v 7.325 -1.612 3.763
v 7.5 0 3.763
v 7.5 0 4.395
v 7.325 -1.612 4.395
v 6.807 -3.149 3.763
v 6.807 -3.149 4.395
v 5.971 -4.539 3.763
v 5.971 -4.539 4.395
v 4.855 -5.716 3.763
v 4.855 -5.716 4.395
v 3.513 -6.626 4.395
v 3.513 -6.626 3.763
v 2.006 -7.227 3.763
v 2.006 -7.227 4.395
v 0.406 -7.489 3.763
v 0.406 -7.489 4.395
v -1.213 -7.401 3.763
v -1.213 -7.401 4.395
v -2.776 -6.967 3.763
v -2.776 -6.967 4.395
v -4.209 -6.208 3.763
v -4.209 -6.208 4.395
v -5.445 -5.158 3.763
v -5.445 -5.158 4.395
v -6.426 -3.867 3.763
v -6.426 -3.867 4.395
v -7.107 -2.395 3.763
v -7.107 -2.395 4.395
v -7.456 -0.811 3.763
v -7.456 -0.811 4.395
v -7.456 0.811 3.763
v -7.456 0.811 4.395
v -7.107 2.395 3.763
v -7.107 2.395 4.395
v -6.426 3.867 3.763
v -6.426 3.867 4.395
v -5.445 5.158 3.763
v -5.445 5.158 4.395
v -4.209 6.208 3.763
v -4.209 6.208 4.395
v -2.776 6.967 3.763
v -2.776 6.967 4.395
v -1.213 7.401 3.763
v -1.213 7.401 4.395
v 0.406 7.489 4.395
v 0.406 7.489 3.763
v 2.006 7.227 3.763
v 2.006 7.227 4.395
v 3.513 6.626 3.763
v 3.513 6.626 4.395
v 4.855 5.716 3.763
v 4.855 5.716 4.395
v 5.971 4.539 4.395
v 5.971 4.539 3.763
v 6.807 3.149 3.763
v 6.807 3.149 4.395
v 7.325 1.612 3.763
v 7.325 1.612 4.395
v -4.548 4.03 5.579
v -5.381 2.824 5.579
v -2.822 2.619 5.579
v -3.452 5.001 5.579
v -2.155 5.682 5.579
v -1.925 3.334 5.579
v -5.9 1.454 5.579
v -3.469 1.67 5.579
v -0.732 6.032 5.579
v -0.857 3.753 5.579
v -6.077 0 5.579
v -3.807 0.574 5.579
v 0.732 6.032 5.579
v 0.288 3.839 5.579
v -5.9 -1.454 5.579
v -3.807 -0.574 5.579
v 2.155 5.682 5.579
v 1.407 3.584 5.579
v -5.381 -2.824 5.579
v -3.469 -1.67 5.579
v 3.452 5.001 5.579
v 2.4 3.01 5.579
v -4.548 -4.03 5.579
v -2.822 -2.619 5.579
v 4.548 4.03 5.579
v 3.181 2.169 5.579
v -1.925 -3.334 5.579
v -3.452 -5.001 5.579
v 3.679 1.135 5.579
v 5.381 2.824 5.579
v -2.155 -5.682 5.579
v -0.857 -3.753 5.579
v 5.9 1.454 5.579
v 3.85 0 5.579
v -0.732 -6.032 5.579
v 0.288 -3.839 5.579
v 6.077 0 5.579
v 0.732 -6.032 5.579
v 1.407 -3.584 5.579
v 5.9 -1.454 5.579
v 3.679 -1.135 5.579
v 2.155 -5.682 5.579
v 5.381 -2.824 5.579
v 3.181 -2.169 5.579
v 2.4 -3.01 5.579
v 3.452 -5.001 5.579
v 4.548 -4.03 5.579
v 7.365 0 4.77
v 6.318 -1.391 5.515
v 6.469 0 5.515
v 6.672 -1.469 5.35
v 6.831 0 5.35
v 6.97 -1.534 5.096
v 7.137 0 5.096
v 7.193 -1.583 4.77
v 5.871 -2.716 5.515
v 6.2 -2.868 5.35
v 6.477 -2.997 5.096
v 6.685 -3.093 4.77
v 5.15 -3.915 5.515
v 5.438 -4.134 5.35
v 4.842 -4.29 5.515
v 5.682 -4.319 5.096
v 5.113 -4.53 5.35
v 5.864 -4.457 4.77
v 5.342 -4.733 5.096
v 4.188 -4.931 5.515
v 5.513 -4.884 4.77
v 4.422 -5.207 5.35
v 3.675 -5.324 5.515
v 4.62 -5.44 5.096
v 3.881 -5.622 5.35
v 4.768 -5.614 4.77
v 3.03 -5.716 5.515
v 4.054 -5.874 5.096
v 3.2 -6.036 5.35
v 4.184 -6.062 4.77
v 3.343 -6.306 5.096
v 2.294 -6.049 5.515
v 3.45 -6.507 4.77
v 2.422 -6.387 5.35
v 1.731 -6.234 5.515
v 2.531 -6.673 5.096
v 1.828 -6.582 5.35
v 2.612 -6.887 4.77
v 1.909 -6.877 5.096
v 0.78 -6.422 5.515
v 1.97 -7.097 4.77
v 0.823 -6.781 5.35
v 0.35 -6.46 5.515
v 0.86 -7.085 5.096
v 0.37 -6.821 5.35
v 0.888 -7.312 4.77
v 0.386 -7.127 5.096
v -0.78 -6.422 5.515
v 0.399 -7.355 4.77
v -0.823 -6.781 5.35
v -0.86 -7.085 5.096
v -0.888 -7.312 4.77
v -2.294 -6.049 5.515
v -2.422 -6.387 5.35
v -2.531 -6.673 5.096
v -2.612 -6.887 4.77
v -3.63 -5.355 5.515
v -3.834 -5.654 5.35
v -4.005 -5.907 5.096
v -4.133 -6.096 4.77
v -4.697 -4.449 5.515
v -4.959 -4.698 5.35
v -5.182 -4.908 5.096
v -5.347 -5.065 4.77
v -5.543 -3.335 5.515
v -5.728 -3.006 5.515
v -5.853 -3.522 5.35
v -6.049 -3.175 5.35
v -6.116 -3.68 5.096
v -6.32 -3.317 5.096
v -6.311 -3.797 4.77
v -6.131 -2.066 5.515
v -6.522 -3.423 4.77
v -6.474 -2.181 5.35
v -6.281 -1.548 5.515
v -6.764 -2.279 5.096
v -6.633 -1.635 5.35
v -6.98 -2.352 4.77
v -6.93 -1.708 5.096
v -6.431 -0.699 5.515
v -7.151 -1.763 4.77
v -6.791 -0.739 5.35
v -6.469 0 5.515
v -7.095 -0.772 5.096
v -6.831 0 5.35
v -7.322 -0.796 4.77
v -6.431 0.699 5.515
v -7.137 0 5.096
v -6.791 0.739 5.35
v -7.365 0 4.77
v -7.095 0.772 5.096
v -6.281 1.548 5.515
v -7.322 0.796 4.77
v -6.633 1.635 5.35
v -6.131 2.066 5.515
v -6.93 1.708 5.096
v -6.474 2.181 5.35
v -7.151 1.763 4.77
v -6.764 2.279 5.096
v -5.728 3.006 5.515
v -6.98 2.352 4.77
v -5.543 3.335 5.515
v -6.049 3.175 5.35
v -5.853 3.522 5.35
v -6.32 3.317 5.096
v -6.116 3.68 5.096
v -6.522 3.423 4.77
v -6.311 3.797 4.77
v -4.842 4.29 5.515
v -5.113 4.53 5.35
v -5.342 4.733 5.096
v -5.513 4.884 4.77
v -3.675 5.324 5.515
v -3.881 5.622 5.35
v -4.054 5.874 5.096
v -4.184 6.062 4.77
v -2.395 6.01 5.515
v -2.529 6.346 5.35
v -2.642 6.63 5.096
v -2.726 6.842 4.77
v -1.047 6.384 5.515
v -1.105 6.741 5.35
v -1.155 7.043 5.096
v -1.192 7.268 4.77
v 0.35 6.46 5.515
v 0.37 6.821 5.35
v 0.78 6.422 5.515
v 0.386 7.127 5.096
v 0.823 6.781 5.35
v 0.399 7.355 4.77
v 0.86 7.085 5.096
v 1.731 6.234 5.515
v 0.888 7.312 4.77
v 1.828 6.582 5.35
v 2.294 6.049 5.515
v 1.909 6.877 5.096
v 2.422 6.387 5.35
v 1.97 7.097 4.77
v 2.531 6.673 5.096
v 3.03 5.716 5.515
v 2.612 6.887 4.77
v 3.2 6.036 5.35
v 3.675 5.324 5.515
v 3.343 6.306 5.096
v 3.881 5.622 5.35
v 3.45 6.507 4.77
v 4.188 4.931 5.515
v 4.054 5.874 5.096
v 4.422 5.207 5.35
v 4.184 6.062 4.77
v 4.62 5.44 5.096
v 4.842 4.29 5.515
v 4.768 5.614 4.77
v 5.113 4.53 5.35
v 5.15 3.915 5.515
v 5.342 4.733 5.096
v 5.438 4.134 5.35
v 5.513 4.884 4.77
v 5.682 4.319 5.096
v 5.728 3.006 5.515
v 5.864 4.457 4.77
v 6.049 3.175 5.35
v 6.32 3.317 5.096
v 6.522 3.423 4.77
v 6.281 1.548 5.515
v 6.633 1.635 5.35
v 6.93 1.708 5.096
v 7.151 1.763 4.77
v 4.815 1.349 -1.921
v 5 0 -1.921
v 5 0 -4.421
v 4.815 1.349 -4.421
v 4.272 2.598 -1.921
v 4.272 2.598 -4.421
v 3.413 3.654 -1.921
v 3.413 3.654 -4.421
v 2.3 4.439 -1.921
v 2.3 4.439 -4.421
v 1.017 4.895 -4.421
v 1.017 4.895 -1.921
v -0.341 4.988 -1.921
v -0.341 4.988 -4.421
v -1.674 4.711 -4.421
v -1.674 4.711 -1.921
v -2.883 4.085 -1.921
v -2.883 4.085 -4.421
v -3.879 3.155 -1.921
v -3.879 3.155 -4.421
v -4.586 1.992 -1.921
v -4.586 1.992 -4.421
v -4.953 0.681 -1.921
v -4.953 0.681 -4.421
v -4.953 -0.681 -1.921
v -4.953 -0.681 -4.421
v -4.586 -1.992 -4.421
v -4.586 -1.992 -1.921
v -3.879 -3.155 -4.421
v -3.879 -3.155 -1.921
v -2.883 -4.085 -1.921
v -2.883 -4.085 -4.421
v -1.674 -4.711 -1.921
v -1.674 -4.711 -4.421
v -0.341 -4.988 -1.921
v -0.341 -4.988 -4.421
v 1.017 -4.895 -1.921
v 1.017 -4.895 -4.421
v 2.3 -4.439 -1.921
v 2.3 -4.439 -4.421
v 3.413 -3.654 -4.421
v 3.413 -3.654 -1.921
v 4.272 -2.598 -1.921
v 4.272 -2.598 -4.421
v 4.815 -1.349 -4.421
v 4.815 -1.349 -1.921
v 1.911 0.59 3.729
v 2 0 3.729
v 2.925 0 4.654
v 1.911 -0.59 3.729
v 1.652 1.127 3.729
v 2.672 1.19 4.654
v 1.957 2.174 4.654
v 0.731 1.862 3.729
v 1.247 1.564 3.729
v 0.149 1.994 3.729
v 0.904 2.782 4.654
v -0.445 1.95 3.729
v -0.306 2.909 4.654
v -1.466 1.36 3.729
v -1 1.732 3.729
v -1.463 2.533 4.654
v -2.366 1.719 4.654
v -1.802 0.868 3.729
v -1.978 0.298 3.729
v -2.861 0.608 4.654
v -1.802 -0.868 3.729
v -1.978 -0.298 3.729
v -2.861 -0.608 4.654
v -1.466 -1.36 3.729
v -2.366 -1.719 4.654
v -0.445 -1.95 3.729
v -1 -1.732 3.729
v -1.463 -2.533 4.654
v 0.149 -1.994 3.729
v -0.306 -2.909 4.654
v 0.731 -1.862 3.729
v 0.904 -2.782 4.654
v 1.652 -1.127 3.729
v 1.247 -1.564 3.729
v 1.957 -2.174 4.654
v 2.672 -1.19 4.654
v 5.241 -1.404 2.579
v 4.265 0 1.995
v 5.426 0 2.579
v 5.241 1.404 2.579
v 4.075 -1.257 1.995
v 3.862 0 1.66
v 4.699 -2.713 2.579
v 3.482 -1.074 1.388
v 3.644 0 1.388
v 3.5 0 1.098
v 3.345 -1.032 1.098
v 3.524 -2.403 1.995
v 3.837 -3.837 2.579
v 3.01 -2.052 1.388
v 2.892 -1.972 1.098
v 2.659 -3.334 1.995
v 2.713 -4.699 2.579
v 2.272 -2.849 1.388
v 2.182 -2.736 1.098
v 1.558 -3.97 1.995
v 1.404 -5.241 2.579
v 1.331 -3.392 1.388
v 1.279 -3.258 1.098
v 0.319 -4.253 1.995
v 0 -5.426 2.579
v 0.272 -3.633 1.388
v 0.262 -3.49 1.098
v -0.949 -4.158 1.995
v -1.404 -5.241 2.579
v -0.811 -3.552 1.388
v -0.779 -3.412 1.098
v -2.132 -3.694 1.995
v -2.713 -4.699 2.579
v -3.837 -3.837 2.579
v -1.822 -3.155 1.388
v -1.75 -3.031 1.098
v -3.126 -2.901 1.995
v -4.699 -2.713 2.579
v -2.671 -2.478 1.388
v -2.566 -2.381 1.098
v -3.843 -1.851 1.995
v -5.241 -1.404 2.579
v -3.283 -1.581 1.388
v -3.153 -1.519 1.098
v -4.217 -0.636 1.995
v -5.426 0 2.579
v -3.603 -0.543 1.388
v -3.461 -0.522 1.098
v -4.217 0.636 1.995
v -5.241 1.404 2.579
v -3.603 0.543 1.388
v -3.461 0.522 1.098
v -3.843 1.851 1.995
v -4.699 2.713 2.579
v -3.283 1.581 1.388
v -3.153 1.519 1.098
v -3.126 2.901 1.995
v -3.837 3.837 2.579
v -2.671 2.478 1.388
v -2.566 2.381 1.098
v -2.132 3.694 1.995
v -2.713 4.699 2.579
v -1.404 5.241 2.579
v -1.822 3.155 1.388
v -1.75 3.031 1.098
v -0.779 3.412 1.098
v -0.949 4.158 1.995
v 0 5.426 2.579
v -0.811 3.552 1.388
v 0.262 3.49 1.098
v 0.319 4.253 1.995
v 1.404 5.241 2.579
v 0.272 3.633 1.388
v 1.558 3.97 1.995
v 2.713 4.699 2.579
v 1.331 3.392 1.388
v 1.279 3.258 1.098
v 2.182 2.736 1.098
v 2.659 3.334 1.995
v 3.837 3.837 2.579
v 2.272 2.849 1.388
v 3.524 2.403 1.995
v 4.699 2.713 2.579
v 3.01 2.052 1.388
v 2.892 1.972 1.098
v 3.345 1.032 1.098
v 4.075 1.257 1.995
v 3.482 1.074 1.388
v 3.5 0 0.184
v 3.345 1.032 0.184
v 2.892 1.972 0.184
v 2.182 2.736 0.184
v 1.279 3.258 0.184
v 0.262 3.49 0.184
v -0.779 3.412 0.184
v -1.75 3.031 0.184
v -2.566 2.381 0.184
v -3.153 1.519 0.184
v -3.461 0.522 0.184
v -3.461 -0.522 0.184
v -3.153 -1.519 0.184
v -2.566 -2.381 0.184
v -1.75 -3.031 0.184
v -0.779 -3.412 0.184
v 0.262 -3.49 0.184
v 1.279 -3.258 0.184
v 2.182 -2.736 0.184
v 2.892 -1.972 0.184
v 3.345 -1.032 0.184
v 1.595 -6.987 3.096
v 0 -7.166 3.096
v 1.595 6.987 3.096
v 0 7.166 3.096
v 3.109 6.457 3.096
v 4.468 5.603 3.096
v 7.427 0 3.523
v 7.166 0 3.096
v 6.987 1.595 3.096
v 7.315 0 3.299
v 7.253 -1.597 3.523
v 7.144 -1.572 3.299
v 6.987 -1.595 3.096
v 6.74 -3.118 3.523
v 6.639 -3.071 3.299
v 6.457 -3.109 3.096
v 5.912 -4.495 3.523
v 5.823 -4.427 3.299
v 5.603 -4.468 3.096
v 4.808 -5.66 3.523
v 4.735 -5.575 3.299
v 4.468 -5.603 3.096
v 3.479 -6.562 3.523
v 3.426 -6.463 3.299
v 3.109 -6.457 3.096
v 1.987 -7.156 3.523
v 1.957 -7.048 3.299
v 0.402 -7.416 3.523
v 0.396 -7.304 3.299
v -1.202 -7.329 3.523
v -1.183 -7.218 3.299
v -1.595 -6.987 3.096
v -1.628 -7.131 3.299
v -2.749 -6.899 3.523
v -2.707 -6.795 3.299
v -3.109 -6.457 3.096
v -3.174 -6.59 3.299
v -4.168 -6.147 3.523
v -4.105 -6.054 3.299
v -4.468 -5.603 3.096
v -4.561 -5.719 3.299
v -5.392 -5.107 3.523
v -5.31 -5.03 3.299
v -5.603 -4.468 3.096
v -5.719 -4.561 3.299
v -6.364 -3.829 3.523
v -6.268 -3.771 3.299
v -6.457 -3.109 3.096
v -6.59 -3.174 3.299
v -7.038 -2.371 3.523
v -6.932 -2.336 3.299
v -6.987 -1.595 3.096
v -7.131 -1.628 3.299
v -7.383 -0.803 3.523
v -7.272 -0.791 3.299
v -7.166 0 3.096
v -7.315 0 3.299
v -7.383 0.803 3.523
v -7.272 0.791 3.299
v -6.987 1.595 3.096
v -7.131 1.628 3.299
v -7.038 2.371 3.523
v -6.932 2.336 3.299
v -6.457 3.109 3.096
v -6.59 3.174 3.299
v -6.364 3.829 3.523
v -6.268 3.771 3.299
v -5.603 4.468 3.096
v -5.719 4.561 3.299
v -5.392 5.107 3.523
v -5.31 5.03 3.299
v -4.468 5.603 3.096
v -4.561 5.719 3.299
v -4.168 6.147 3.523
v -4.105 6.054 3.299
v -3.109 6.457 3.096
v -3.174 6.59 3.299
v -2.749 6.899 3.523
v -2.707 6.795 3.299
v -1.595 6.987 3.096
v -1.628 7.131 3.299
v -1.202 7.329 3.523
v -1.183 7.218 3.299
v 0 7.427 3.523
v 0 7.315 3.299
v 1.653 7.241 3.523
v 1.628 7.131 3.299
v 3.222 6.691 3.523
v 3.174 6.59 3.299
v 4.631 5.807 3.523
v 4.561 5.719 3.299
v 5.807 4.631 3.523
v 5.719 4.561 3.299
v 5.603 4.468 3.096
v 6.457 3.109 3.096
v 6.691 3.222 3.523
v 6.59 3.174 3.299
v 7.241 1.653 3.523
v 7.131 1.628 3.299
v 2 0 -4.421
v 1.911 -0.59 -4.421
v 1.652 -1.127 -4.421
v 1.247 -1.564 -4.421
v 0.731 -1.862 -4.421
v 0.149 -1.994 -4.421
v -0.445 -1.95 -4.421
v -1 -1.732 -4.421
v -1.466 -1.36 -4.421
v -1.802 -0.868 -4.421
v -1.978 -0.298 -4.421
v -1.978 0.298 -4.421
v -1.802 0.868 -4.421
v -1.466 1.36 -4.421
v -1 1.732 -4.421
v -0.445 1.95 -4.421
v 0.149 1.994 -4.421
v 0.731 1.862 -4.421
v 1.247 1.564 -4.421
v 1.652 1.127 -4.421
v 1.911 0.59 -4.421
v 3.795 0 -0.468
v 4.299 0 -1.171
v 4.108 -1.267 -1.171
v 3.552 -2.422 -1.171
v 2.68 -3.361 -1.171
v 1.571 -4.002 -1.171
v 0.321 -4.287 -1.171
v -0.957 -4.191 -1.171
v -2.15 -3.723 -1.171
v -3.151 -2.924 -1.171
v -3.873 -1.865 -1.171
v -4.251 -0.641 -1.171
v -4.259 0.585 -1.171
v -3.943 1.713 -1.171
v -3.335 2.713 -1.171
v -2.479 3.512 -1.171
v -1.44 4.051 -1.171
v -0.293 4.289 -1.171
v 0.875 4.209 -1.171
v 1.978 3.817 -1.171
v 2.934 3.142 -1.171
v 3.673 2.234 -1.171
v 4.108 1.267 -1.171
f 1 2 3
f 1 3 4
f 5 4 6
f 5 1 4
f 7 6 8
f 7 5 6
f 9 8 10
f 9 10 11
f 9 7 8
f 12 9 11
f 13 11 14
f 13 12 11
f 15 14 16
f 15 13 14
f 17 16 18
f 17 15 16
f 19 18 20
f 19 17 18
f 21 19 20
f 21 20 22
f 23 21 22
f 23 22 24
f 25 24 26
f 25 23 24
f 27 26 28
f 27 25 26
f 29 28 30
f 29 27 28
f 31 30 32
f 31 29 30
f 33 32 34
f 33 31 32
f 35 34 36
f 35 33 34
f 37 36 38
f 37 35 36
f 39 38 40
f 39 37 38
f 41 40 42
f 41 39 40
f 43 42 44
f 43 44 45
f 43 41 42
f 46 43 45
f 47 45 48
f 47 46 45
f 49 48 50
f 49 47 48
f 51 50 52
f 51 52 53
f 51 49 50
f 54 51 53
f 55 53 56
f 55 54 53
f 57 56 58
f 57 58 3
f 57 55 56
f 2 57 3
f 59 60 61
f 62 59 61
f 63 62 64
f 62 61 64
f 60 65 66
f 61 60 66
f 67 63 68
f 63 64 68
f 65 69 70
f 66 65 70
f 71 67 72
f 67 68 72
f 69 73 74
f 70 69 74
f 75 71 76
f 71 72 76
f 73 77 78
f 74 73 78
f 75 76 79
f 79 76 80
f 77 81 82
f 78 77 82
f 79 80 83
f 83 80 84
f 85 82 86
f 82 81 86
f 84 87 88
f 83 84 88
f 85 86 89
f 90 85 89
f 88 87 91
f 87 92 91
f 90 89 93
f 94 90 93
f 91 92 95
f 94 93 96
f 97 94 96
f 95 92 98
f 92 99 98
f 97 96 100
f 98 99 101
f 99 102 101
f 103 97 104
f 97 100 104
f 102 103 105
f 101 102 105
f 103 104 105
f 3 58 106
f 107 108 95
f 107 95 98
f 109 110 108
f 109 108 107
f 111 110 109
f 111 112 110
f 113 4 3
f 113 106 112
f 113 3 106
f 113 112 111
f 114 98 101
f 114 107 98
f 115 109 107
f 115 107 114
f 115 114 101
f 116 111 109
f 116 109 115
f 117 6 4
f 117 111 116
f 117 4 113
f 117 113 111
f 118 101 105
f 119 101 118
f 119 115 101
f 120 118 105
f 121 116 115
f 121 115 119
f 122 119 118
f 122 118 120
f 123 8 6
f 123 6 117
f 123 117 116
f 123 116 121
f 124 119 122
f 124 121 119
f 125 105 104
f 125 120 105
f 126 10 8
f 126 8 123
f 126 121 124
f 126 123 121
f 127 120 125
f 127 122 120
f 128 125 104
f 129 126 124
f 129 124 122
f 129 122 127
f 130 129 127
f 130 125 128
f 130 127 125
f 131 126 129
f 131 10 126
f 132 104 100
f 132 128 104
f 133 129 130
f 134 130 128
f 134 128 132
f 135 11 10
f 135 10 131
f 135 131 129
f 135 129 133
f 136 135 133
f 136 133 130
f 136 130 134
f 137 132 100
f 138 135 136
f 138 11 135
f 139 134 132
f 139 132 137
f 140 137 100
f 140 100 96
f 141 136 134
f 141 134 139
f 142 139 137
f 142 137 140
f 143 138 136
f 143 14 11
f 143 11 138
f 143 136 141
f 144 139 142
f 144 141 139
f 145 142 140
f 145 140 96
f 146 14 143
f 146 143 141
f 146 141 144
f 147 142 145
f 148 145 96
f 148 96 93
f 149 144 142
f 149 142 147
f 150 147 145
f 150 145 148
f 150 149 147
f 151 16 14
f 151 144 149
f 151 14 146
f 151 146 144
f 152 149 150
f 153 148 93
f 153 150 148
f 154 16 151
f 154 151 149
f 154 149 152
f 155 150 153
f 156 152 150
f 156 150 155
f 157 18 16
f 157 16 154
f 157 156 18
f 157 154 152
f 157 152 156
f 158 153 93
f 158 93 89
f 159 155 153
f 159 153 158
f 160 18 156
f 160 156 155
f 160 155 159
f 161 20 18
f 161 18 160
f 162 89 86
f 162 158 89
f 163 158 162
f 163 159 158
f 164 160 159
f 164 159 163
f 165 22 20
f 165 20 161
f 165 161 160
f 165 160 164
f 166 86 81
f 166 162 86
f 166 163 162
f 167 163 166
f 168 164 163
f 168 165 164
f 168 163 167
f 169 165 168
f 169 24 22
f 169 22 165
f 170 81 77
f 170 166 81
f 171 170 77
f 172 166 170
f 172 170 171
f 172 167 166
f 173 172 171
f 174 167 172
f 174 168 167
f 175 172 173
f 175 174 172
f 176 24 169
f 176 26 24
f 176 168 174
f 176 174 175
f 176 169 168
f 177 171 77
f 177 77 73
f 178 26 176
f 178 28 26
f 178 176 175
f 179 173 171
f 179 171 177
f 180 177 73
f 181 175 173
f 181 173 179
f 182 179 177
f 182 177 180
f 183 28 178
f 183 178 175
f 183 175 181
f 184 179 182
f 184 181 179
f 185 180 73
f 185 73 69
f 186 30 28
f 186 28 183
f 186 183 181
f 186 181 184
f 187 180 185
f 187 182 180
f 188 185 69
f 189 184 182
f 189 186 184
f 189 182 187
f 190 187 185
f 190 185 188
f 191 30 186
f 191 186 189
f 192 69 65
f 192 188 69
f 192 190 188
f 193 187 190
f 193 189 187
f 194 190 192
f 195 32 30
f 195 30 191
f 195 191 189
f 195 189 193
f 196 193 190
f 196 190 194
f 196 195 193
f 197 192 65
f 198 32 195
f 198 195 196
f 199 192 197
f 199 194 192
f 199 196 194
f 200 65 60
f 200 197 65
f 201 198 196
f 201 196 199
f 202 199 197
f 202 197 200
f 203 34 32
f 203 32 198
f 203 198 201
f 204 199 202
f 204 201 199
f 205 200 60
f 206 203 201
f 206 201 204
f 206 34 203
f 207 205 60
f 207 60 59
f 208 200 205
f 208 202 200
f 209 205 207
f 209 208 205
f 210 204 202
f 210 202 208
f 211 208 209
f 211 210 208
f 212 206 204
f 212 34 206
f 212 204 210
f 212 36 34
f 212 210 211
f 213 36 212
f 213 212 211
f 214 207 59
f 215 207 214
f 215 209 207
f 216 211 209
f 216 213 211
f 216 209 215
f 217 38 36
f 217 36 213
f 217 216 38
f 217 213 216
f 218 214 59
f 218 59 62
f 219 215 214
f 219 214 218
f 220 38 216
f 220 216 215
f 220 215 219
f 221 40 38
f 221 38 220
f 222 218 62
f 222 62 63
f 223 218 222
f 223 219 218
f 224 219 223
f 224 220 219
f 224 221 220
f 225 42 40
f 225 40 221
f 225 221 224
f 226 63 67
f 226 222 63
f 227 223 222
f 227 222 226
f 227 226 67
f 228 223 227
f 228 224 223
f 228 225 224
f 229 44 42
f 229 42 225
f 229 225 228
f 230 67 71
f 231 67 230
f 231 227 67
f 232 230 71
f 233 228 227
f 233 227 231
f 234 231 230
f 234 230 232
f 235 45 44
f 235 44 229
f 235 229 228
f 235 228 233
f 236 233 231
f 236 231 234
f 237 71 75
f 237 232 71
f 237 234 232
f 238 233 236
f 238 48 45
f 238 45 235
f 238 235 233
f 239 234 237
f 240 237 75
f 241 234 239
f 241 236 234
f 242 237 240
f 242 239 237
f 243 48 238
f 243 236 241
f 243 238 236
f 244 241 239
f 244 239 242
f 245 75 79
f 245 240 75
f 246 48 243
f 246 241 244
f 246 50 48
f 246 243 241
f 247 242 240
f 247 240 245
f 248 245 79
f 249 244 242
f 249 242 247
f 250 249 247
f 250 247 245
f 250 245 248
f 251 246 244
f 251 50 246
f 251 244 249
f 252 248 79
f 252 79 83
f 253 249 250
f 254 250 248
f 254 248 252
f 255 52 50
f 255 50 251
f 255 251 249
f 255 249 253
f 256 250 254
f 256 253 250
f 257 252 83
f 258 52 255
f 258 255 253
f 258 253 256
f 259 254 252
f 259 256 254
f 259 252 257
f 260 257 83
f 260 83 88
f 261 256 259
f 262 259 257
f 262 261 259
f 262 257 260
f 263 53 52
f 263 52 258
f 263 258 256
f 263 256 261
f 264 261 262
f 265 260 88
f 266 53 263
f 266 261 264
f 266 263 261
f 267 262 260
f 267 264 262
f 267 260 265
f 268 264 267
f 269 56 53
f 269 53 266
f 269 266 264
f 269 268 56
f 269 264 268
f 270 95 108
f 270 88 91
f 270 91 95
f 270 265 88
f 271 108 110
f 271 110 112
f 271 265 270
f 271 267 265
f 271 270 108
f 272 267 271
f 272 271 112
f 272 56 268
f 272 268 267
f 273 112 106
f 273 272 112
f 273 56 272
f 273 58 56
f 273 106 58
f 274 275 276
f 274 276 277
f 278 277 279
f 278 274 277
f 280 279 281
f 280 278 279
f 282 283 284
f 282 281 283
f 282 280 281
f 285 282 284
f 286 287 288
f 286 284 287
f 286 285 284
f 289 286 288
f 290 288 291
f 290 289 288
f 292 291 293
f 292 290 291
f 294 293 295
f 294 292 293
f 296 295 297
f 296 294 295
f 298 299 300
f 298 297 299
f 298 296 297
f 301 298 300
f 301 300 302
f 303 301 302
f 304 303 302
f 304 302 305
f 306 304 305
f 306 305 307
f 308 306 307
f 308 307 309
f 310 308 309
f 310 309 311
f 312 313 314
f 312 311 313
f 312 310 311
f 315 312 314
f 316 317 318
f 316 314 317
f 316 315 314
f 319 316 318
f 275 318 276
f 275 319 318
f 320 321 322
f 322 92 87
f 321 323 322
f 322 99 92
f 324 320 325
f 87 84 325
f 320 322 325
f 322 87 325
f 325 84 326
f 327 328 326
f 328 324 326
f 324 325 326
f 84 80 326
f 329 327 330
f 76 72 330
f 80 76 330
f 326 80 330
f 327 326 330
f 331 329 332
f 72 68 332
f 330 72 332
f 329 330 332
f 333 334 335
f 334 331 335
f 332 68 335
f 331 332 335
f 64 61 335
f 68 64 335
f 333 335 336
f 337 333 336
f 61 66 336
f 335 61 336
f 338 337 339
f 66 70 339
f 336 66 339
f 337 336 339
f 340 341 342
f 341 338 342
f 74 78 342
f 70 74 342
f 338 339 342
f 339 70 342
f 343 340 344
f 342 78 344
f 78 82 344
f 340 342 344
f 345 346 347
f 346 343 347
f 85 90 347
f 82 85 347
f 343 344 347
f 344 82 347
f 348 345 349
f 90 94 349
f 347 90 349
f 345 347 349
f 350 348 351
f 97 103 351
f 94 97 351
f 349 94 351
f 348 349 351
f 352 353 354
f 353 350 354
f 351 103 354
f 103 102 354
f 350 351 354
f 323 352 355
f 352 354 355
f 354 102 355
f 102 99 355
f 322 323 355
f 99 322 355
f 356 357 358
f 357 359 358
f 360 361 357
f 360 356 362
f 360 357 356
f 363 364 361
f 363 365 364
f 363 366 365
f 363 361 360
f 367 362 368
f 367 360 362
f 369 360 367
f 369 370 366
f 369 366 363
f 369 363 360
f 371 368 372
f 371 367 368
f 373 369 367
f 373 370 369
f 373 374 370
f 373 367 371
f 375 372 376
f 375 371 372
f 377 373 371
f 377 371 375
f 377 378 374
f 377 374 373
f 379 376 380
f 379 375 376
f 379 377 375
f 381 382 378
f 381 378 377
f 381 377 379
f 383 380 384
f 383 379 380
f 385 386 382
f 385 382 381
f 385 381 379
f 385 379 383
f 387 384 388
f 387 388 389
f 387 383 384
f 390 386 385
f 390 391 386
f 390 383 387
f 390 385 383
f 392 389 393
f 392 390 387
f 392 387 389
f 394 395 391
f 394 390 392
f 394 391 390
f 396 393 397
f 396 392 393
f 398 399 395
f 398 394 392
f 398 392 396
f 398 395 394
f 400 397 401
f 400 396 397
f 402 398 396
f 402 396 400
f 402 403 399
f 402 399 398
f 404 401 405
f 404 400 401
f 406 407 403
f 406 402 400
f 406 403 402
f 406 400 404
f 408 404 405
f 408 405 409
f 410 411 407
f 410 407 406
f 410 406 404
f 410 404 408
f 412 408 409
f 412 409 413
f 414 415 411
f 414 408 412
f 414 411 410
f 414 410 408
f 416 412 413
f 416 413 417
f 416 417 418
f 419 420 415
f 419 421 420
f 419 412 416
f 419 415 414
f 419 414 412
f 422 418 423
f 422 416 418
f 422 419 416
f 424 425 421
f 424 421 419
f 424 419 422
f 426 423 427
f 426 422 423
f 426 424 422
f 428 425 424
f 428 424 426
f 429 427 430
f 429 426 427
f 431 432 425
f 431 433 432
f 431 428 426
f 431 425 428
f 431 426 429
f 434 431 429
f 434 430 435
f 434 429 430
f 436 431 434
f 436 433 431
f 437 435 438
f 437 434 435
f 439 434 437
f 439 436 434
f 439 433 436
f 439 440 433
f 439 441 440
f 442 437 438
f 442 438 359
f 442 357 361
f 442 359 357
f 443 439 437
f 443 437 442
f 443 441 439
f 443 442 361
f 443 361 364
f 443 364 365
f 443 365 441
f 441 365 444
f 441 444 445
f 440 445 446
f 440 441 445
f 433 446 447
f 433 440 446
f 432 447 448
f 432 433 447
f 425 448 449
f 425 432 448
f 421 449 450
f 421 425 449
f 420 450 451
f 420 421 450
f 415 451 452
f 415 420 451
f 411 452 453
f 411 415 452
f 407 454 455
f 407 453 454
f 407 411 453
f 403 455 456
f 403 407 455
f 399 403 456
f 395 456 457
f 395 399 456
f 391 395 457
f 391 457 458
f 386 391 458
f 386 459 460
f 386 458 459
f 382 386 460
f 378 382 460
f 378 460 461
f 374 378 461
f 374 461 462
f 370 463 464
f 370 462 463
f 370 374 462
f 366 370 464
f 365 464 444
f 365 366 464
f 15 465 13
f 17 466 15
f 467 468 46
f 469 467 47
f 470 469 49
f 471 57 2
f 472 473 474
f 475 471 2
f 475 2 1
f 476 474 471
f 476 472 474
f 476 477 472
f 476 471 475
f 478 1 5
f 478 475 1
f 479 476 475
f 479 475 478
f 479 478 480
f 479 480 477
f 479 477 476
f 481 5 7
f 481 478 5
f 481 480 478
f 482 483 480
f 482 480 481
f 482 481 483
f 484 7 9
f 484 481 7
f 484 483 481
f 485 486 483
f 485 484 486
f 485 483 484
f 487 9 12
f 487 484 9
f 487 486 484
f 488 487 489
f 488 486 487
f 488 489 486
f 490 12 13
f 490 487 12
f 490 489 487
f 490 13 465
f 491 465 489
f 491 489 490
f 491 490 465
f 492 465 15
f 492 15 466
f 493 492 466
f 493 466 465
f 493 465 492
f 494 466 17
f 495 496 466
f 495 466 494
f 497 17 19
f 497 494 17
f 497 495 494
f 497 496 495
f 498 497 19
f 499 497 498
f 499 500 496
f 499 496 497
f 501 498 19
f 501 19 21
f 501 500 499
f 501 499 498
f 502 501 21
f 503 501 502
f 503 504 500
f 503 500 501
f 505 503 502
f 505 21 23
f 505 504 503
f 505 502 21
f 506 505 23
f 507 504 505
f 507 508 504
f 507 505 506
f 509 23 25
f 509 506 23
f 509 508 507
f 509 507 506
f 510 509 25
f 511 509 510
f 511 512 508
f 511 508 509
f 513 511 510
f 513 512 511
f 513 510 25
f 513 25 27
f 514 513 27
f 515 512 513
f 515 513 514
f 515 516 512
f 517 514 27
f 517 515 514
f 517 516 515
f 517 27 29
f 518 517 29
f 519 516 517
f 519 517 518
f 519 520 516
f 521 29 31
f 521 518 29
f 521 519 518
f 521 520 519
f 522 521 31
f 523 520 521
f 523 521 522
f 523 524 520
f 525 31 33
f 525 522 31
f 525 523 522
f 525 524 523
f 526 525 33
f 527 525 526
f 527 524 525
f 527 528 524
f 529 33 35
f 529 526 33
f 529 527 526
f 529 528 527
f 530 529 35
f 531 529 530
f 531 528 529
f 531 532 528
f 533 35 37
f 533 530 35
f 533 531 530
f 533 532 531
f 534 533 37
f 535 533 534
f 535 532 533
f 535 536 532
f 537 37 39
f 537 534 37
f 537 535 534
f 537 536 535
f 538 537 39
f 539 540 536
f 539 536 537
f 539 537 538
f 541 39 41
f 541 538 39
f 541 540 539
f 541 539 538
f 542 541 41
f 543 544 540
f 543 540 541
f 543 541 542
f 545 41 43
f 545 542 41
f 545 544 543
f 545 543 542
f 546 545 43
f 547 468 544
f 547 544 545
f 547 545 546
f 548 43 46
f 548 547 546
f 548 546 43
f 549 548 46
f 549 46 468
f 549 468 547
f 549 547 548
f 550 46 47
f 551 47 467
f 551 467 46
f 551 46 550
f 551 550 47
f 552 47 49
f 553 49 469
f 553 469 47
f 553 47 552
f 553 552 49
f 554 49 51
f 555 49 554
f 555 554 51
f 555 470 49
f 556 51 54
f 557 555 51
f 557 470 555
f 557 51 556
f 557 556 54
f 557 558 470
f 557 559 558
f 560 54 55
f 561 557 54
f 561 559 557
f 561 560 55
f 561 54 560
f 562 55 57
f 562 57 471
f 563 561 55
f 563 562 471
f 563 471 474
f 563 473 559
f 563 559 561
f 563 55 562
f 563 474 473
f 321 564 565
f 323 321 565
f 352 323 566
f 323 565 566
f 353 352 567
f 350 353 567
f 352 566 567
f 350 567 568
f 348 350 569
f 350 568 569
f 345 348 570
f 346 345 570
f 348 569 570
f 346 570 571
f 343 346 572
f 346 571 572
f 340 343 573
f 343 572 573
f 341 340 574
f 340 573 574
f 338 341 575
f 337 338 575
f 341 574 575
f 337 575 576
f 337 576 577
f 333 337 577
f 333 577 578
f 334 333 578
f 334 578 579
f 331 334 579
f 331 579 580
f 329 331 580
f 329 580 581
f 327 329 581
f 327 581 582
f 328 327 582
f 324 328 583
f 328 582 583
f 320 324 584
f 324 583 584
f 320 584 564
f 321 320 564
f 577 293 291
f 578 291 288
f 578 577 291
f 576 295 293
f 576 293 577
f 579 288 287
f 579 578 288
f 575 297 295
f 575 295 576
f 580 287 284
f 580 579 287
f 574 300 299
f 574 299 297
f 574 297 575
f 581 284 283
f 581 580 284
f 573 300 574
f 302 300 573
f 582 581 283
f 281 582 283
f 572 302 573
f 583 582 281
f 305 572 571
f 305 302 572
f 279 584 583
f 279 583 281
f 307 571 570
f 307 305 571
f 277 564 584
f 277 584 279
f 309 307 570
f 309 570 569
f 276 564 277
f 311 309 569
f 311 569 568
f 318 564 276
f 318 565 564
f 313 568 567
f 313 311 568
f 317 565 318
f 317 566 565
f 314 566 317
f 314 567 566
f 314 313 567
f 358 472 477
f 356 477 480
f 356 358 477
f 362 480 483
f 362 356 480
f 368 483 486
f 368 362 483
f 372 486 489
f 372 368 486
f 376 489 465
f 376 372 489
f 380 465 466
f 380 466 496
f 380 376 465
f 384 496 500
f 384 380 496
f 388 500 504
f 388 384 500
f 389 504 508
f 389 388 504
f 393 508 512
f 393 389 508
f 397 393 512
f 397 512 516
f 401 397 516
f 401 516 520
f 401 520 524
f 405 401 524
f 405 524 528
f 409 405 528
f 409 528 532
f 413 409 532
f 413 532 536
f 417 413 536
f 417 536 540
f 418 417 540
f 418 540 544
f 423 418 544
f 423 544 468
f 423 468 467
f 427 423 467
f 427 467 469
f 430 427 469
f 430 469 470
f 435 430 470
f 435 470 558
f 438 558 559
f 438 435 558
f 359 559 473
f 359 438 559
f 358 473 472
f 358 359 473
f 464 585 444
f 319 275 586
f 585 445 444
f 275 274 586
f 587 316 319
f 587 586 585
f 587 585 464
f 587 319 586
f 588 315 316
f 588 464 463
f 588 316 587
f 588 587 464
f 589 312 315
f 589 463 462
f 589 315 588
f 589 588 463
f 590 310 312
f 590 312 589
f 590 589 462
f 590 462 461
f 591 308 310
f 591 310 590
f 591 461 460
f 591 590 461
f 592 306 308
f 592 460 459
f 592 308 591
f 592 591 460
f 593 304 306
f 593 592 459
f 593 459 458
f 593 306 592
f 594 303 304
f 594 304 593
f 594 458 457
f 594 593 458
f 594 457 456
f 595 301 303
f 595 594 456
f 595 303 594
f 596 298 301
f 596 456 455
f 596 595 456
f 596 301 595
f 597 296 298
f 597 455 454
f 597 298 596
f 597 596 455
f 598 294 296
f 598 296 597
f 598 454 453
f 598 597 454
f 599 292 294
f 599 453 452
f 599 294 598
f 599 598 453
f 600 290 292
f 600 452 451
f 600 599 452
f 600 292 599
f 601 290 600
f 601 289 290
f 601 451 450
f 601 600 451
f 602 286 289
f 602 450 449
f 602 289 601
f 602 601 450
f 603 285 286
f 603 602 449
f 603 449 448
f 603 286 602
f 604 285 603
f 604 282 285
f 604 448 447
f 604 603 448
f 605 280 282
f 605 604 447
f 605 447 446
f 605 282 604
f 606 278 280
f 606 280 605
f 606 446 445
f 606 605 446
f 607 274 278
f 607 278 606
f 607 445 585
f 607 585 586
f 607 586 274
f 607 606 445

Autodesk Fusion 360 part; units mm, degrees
sketch "Sketch1" plane through (0, 0, 0) normal (0, 1, 0) x (1, 0, 0)
  line L0 (0, -10) -> (0, 10)
  line L1 (2, -3.729) -> (2, 4.421)
  line L2 (2, 4.421) -> (3.5, 4.421)
  line L3 (3.85, -5.579) -> (6.0767, -5.579)
  line L4 (3.5, 4.421) -> (3.5, -5.229)
  line L5 (7.5, -4.3954) -> (7.5, -3.7633)
  line L6 (5.4261, -2.579) -> (3.5, -2.579)
  line L7 (3.5, 4.421) -> (5, 4.421)
  line L8 (5, 4.421) -> (5, 1.921)
  line L9 (5, 1.921) -> (3.3307, 1.921)
  arc A0 (6.0767, -5.579) -> (7.1665, -3.096) centre (6.0334, -4.0794) ccw
  spline S0 degree 5 poles (7.1665, -3.096) (6.933, -3.0417) (6.4824, -2.9292) (5.8552, -2.7485) (5.1184, -2.4835) (4.3745, -2.1094) (3.9119, -1.7552) (3.6679, -1.4589) (3.5538, -1.242) (3.5075, -1.1195) (3.5, -1.0984) knots 0 0 0 0 0 0 0.1 0.2 0.3 0.4 0.5 0.520654 0.520654 0.520654 0.520654 0.520654 0.520654
  line L10 (3.5931, -1.3616) -> (3.4069, -0.8351)
  spline S1 degree 5 poles (3.5, -0.1837) (3.505, -0.1666) (3.547, -0.0298) (3.6508, 0.2328) (3.8703, 0.6342) (4.183, 1.0582) (4.561, 1.4822) (4.8479, 1.7733) (5, 1.921) knots 0.685718 0.685718 0.685718 0.685718 0.685718 0.685718 0.7 0.8 0.9 1 1 1 1 1 1
  line L11 (3.4418, -0.381) -> (3.5582, 0.0137)
  line L12 (3.85, -5.579) -> (9.2988, -5.579) construction
  line L13 (3.85, -5.579) -> (2, -3.729)
  line L14 (0, -1.729) -> (-0.0029, -1.7262)
  dimension "d1" = 2
  dimension "d3" = 1.5
  dimension "d6" = 1.5
  dimension "d7" = 2.5
  dimension "d9" = 135
revolve "Revolve1" add sketch "Sketch1" angle 360 about axis through (0, 0, 10) along (0, 0, -1) contours L1 L2 L4 L13 | L3 L4 L5 L6 A0 S0 L13 | L4 L7 L8 L9 | L4 L6 S0 | L4 L9 S1
